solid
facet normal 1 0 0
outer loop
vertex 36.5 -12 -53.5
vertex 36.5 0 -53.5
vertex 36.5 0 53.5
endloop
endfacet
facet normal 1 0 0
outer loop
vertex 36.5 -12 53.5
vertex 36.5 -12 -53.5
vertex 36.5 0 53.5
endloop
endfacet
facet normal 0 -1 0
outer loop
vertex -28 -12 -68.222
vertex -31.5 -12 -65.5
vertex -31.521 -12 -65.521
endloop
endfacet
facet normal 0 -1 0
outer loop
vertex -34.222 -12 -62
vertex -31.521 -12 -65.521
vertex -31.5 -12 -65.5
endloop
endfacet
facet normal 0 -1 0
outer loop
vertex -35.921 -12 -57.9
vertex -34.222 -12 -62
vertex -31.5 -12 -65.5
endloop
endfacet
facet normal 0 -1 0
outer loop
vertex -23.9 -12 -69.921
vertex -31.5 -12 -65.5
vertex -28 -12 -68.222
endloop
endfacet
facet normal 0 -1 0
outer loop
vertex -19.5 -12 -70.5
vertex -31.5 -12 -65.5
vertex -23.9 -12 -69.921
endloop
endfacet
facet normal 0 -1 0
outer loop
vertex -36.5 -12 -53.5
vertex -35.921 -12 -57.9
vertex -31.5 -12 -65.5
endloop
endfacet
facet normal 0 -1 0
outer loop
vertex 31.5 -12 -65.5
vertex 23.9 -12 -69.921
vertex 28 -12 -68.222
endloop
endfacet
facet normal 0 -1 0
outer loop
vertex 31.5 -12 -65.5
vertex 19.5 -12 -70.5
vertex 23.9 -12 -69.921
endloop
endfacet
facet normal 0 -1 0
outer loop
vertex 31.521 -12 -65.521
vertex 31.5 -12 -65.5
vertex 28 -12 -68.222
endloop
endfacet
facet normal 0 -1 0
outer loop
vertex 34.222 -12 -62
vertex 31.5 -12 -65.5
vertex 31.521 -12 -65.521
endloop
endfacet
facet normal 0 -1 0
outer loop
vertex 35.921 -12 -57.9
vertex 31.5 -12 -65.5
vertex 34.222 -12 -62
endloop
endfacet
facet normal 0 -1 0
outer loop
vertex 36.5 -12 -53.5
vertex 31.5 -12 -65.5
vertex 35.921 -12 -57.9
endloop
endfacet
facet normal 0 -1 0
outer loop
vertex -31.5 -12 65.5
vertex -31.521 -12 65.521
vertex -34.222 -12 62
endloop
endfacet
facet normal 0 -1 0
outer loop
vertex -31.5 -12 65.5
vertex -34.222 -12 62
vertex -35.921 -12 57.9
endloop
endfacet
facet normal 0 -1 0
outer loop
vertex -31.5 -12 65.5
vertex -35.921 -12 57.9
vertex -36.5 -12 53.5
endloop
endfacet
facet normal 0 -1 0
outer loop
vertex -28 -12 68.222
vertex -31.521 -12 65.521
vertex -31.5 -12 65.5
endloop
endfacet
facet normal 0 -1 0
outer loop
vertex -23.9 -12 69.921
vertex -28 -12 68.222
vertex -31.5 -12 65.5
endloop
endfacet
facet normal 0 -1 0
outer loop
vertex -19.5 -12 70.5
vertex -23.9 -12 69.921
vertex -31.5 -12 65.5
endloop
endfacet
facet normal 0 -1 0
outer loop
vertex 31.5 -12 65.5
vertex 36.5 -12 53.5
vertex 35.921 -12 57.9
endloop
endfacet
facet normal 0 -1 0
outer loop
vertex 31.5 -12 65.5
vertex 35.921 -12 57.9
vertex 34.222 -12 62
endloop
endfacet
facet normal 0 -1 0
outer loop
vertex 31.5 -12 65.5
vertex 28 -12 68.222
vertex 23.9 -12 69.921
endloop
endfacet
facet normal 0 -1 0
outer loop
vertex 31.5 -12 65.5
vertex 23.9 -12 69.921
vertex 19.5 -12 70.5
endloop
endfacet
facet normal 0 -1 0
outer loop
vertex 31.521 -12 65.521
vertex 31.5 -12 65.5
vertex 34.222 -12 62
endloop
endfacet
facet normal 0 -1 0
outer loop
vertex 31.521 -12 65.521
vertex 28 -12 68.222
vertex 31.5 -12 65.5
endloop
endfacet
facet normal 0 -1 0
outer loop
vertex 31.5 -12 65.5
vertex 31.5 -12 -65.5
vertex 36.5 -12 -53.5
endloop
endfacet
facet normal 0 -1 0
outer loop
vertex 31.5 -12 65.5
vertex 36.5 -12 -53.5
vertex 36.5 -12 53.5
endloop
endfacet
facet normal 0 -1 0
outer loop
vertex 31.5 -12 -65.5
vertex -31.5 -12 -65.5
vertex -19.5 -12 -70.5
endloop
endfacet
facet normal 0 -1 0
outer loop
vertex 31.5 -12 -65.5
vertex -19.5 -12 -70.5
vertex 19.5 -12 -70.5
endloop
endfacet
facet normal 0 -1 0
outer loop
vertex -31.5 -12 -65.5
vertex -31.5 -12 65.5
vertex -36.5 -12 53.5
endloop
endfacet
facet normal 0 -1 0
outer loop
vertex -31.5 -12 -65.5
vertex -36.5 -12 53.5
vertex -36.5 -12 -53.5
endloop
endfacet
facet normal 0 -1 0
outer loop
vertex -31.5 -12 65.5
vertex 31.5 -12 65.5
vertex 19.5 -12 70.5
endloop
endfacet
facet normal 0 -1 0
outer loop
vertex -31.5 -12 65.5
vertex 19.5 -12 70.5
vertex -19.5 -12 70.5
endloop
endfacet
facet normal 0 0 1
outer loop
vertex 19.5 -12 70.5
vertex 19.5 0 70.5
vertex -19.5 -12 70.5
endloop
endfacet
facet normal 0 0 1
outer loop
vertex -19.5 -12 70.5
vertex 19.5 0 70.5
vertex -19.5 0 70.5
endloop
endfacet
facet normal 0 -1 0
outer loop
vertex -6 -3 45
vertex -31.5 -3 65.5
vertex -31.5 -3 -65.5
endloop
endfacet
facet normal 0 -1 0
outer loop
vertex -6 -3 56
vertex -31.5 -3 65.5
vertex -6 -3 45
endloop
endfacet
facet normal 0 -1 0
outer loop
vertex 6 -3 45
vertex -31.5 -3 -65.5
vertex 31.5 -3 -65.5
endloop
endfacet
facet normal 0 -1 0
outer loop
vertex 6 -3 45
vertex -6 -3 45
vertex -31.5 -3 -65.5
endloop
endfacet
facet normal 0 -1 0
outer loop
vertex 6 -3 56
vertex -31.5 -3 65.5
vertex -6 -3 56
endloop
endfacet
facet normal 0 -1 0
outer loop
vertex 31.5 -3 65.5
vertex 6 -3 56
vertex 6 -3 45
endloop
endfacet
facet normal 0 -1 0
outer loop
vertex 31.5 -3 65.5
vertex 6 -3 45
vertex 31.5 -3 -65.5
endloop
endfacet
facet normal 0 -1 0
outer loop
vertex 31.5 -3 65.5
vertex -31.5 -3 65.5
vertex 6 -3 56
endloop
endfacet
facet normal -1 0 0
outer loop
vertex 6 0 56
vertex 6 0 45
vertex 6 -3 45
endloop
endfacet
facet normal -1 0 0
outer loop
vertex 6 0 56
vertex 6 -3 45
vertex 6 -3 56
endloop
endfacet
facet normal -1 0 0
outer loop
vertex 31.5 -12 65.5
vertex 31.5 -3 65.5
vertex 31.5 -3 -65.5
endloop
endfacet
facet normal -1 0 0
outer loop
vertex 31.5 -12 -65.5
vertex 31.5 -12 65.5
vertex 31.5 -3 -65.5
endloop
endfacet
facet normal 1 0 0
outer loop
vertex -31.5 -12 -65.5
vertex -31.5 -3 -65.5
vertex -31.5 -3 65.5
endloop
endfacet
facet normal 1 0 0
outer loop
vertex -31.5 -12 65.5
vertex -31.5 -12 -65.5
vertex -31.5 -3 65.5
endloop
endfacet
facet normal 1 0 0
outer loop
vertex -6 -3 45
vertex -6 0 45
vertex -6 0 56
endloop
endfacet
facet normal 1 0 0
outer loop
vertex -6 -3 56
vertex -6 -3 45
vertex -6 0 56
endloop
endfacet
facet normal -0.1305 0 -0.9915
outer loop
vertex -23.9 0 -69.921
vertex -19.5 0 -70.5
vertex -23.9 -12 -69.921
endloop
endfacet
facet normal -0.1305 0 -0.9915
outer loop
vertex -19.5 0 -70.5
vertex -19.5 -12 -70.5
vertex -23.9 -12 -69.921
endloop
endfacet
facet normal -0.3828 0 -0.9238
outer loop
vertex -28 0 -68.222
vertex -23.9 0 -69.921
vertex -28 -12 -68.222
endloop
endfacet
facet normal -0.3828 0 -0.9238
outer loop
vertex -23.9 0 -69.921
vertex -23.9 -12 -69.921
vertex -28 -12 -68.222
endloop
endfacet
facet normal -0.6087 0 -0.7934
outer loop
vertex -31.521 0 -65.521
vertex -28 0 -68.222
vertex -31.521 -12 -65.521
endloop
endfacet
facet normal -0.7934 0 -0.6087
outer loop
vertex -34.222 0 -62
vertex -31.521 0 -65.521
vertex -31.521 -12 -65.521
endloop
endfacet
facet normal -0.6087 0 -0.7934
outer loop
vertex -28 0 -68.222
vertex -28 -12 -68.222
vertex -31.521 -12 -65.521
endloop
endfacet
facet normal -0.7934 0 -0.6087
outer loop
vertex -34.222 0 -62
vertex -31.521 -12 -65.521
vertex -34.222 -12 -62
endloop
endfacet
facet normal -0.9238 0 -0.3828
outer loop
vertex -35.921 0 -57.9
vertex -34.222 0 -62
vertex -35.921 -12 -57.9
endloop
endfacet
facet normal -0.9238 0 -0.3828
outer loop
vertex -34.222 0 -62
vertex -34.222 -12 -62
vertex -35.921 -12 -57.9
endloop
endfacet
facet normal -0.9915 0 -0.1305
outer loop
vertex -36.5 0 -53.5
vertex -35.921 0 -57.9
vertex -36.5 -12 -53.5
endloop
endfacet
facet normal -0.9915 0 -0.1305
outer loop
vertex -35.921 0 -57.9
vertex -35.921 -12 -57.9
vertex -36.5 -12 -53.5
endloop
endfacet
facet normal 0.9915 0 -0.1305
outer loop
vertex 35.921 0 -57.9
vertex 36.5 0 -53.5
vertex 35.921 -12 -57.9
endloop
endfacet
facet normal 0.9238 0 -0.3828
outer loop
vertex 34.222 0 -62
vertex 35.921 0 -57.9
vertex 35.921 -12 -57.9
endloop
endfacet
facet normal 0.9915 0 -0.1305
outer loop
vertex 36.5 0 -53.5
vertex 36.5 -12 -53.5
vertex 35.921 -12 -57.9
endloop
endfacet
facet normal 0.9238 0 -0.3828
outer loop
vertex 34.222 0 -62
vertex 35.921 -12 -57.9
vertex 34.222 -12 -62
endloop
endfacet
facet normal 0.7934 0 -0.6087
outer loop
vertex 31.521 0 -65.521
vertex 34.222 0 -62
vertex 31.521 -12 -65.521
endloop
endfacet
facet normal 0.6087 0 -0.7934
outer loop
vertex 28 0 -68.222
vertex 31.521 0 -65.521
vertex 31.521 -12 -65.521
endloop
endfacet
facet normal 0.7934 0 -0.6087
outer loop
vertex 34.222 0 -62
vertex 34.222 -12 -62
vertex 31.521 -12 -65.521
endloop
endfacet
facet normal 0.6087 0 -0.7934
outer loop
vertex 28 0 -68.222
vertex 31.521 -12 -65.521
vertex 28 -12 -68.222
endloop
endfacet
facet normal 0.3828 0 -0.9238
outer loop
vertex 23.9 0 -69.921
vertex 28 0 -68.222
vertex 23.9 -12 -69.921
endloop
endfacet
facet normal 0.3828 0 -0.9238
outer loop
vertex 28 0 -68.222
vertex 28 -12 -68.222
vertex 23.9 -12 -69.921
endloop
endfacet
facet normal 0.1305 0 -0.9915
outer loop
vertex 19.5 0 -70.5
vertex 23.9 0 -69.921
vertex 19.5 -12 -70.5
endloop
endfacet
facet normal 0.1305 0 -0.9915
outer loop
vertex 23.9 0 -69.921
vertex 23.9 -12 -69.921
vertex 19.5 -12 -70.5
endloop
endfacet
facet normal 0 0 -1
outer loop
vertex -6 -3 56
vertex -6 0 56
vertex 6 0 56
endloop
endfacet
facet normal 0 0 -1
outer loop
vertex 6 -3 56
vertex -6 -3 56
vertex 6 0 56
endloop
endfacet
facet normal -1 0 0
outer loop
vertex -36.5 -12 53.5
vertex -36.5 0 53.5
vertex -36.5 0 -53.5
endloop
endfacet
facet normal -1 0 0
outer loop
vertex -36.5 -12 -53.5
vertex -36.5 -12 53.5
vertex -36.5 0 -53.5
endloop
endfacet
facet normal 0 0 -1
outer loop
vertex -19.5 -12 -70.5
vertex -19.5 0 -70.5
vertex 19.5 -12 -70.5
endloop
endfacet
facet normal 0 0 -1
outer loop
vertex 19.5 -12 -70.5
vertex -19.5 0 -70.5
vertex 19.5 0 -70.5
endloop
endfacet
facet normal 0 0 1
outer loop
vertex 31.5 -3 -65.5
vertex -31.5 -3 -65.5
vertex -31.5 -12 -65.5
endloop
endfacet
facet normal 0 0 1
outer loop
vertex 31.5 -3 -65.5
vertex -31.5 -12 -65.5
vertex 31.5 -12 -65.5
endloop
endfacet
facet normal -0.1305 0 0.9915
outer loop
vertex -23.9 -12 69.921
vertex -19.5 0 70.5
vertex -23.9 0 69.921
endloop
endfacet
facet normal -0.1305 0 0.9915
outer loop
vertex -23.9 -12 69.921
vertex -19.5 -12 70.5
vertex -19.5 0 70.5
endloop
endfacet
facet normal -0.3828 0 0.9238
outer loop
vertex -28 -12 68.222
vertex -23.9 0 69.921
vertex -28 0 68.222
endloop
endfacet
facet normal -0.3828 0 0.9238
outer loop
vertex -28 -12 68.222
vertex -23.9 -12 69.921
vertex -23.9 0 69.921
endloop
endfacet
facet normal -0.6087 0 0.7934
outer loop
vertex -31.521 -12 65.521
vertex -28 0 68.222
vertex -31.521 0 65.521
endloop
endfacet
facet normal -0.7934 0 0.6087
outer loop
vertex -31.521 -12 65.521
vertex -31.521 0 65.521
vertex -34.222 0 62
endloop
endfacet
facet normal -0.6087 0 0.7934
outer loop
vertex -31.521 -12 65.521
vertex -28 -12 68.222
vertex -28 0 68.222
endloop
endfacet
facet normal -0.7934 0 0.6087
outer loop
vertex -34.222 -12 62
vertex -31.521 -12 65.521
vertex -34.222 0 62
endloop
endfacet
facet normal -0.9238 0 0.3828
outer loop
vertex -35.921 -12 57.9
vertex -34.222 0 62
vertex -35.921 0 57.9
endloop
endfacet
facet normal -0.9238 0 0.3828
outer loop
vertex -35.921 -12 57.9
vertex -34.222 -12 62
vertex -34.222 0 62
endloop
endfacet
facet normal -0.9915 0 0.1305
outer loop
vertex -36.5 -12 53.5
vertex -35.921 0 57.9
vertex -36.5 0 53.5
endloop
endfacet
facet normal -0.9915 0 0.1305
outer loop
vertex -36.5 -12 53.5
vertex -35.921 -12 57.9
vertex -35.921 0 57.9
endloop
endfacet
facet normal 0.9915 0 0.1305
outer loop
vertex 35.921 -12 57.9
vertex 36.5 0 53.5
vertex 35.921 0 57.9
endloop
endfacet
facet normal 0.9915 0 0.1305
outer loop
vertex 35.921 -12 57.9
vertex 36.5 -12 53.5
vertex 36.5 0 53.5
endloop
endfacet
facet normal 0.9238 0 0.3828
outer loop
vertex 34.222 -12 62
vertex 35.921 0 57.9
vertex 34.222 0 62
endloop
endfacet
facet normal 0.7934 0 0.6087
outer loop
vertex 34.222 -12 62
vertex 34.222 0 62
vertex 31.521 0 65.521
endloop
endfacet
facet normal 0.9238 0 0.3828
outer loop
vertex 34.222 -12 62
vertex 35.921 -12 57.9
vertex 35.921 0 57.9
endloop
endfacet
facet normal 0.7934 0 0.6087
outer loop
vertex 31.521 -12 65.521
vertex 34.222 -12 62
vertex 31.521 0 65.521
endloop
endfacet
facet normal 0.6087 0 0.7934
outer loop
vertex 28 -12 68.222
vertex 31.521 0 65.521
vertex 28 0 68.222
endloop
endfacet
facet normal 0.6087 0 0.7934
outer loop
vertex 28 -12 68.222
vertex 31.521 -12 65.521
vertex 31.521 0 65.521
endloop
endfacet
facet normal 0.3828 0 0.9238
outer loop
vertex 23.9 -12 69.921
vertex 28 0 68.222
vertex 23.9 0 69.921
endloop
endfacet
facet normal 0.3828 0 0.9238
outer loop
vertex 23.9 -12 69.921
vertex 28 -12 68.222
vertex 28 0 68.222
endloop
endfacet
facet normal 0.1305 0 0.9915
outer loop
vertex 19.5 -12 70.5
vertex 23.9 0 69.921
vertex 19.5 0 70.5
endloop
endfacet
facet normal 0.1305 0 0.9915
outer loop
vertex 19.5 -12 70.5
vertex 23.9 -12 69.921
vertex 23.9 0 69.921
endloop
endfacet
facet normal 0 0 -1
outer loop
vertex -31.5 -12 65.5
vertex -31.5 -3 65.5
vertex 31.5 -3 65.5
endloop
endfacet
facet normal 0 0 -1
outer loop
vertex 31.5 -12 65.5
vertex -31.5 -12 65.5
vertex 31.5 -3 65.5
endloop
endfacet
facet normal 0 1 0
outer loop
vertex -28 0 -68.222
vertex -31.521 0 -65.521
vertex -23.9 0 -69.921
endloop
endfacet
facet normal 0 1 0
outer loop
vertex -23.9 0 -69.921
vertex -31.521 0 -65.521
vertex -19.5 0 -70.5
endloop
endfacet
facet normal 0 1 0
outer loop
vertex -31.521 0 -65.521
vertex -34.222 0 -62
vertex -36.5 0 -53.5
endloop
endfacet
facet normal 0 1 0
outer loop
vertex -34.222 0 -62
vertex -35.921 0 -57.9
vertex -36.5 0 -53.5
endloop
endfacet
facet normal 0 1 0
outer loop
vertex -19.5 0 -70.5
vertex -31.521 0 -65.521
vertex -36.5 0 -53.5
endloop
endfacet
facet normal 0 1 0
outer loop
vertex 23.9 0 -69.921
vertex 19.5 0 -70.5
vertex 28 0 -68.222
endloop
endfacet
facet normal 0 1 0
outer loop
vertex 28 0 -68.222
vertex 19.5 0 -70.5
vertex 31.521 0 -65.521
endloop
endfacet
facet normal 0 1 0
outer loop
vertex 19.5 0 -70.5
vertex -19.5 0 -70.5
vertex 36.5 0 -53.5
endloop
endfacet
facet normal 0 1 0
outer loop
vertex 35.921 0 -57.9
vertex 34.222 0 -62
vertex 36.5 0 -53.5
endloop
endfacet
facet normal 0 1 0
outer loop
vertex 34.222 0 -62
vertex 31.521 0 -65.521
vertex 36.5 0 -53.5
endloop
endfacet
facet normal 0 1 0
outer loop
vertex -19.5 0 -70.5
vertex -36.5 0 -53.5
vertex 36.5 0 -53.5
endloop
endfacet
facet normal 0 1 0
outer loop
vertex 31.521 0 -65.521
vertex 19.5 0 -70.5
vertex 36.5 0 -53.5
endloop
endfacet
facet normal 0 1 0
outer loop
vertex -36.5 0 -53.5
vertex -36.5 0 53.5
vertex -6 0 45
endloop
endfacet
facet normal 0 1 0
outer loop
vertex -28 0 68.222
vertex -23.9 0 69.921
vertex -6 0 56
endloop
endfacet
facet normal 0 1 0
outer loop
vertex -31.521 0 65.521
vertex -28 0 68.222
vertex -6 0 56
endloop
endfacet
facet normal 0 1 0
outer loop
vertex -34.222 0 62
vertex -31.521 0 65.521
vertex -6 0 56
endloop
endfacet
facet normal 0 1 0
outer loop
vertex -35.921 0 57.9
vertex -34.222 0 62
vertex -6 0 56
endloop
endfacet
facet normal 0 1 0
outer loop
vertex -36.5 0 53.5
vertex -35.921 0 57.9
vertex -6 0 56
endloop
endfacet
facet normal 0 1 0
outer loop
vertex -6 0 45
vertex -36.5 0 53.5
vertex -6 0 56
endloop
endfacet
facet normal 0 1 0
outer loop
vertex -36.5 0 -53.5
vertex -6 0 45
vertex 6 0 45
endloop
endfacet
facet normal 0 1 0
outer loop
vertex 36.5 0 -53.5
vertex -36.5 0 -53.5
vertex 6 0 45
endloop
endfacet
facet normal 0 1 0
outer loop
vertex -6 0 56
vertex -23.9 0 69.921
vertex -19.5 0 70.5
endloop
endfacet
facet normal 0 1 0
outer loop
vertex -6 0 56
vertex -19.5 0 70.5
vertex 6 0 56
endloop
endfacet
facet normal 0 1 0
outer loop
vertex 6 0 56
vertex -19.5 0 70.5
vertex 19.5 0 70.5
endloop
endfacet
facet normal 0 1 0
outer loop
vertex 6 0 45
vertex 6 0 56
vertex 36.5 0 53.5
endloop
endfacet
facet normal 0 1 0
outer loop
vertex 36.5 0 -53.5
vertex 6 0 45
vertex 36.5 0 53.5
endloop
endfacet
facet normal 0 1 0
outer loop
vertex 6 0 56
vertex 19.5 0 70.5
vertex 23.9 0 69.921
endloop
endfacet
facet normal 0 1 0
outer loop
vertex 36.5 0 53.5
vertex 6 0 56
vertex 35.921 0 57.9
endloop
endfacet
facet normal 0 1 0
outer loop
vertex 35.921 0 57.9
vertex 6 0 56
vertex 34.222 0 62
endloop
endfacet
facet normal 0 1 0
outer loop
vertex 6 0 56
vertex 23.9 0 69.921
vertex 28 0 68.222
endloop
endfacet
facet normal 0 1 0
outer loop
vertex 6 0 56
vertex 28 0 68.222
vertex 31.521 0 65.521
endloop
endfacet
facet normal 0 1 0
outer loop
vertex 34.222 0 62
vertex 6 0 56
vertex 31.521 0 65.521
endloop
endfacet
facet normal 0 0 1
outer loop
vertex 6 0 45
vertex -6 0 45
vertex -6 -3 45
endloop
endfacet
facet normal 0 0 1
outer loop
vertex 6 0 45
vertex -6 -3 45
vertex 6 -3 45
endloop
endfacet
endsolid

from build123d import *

# Parameters (mm, degrees)
F0_W     = 63
F0_H     = 131
F0_W_2   = 12
F0_H_2   = 11
F1_DEPTH = 3
F0_H_3   = 5
F2_DEPTH = 12
F3_R     = 17


with BuildPart() as f1:
    # F0 (on Front) → F1 (new body)
    with BuildSketch(Plane.XZ):
        Rectangle(F0_W, F0_H)
        with Locations((0, 50.5)):
            Rectangle(F0_W_2, F0_H_2, mode=Mode.SUBTRACT)
    extrude(amount=F1_DEPTH)

    # F0 (on Front) → F2 (join)
    with BuildSketch(Plane.XZ):
        Polygon((31.5, -70.5), (36.5, -70.5), (36.5, 70.5), (31.5, 70.5), (31.5, 65.5), (31.5, -65.5), align=None)
        with Locations((0, -68)):
            Rectangle(F0_W, F0_H_3)
        Polygon((-36.5, -70.5), (-31.5, -70.5), (-31.5, -65.5), (-31.5, 65.5), (-31.5, 70.5), (-36.5, 70.5), align=None)
        with Locations((0, 68)):
            Rectangle(F0_W, F0_H_3)
    extrude(amount=F2_DEPTH)

    # F3
    f3_edges = [f1.edges().sort_by_distance(p)[0] for p in [
        (36.5, -6, 70.5),
        (-36.5, -6, 70.5),
        (-36.5, -6, -70.5),
        (36.5, -6, -70.5),
    ]]
    fillet(f3_edges, radius=F3_R)


solid = f1.part
